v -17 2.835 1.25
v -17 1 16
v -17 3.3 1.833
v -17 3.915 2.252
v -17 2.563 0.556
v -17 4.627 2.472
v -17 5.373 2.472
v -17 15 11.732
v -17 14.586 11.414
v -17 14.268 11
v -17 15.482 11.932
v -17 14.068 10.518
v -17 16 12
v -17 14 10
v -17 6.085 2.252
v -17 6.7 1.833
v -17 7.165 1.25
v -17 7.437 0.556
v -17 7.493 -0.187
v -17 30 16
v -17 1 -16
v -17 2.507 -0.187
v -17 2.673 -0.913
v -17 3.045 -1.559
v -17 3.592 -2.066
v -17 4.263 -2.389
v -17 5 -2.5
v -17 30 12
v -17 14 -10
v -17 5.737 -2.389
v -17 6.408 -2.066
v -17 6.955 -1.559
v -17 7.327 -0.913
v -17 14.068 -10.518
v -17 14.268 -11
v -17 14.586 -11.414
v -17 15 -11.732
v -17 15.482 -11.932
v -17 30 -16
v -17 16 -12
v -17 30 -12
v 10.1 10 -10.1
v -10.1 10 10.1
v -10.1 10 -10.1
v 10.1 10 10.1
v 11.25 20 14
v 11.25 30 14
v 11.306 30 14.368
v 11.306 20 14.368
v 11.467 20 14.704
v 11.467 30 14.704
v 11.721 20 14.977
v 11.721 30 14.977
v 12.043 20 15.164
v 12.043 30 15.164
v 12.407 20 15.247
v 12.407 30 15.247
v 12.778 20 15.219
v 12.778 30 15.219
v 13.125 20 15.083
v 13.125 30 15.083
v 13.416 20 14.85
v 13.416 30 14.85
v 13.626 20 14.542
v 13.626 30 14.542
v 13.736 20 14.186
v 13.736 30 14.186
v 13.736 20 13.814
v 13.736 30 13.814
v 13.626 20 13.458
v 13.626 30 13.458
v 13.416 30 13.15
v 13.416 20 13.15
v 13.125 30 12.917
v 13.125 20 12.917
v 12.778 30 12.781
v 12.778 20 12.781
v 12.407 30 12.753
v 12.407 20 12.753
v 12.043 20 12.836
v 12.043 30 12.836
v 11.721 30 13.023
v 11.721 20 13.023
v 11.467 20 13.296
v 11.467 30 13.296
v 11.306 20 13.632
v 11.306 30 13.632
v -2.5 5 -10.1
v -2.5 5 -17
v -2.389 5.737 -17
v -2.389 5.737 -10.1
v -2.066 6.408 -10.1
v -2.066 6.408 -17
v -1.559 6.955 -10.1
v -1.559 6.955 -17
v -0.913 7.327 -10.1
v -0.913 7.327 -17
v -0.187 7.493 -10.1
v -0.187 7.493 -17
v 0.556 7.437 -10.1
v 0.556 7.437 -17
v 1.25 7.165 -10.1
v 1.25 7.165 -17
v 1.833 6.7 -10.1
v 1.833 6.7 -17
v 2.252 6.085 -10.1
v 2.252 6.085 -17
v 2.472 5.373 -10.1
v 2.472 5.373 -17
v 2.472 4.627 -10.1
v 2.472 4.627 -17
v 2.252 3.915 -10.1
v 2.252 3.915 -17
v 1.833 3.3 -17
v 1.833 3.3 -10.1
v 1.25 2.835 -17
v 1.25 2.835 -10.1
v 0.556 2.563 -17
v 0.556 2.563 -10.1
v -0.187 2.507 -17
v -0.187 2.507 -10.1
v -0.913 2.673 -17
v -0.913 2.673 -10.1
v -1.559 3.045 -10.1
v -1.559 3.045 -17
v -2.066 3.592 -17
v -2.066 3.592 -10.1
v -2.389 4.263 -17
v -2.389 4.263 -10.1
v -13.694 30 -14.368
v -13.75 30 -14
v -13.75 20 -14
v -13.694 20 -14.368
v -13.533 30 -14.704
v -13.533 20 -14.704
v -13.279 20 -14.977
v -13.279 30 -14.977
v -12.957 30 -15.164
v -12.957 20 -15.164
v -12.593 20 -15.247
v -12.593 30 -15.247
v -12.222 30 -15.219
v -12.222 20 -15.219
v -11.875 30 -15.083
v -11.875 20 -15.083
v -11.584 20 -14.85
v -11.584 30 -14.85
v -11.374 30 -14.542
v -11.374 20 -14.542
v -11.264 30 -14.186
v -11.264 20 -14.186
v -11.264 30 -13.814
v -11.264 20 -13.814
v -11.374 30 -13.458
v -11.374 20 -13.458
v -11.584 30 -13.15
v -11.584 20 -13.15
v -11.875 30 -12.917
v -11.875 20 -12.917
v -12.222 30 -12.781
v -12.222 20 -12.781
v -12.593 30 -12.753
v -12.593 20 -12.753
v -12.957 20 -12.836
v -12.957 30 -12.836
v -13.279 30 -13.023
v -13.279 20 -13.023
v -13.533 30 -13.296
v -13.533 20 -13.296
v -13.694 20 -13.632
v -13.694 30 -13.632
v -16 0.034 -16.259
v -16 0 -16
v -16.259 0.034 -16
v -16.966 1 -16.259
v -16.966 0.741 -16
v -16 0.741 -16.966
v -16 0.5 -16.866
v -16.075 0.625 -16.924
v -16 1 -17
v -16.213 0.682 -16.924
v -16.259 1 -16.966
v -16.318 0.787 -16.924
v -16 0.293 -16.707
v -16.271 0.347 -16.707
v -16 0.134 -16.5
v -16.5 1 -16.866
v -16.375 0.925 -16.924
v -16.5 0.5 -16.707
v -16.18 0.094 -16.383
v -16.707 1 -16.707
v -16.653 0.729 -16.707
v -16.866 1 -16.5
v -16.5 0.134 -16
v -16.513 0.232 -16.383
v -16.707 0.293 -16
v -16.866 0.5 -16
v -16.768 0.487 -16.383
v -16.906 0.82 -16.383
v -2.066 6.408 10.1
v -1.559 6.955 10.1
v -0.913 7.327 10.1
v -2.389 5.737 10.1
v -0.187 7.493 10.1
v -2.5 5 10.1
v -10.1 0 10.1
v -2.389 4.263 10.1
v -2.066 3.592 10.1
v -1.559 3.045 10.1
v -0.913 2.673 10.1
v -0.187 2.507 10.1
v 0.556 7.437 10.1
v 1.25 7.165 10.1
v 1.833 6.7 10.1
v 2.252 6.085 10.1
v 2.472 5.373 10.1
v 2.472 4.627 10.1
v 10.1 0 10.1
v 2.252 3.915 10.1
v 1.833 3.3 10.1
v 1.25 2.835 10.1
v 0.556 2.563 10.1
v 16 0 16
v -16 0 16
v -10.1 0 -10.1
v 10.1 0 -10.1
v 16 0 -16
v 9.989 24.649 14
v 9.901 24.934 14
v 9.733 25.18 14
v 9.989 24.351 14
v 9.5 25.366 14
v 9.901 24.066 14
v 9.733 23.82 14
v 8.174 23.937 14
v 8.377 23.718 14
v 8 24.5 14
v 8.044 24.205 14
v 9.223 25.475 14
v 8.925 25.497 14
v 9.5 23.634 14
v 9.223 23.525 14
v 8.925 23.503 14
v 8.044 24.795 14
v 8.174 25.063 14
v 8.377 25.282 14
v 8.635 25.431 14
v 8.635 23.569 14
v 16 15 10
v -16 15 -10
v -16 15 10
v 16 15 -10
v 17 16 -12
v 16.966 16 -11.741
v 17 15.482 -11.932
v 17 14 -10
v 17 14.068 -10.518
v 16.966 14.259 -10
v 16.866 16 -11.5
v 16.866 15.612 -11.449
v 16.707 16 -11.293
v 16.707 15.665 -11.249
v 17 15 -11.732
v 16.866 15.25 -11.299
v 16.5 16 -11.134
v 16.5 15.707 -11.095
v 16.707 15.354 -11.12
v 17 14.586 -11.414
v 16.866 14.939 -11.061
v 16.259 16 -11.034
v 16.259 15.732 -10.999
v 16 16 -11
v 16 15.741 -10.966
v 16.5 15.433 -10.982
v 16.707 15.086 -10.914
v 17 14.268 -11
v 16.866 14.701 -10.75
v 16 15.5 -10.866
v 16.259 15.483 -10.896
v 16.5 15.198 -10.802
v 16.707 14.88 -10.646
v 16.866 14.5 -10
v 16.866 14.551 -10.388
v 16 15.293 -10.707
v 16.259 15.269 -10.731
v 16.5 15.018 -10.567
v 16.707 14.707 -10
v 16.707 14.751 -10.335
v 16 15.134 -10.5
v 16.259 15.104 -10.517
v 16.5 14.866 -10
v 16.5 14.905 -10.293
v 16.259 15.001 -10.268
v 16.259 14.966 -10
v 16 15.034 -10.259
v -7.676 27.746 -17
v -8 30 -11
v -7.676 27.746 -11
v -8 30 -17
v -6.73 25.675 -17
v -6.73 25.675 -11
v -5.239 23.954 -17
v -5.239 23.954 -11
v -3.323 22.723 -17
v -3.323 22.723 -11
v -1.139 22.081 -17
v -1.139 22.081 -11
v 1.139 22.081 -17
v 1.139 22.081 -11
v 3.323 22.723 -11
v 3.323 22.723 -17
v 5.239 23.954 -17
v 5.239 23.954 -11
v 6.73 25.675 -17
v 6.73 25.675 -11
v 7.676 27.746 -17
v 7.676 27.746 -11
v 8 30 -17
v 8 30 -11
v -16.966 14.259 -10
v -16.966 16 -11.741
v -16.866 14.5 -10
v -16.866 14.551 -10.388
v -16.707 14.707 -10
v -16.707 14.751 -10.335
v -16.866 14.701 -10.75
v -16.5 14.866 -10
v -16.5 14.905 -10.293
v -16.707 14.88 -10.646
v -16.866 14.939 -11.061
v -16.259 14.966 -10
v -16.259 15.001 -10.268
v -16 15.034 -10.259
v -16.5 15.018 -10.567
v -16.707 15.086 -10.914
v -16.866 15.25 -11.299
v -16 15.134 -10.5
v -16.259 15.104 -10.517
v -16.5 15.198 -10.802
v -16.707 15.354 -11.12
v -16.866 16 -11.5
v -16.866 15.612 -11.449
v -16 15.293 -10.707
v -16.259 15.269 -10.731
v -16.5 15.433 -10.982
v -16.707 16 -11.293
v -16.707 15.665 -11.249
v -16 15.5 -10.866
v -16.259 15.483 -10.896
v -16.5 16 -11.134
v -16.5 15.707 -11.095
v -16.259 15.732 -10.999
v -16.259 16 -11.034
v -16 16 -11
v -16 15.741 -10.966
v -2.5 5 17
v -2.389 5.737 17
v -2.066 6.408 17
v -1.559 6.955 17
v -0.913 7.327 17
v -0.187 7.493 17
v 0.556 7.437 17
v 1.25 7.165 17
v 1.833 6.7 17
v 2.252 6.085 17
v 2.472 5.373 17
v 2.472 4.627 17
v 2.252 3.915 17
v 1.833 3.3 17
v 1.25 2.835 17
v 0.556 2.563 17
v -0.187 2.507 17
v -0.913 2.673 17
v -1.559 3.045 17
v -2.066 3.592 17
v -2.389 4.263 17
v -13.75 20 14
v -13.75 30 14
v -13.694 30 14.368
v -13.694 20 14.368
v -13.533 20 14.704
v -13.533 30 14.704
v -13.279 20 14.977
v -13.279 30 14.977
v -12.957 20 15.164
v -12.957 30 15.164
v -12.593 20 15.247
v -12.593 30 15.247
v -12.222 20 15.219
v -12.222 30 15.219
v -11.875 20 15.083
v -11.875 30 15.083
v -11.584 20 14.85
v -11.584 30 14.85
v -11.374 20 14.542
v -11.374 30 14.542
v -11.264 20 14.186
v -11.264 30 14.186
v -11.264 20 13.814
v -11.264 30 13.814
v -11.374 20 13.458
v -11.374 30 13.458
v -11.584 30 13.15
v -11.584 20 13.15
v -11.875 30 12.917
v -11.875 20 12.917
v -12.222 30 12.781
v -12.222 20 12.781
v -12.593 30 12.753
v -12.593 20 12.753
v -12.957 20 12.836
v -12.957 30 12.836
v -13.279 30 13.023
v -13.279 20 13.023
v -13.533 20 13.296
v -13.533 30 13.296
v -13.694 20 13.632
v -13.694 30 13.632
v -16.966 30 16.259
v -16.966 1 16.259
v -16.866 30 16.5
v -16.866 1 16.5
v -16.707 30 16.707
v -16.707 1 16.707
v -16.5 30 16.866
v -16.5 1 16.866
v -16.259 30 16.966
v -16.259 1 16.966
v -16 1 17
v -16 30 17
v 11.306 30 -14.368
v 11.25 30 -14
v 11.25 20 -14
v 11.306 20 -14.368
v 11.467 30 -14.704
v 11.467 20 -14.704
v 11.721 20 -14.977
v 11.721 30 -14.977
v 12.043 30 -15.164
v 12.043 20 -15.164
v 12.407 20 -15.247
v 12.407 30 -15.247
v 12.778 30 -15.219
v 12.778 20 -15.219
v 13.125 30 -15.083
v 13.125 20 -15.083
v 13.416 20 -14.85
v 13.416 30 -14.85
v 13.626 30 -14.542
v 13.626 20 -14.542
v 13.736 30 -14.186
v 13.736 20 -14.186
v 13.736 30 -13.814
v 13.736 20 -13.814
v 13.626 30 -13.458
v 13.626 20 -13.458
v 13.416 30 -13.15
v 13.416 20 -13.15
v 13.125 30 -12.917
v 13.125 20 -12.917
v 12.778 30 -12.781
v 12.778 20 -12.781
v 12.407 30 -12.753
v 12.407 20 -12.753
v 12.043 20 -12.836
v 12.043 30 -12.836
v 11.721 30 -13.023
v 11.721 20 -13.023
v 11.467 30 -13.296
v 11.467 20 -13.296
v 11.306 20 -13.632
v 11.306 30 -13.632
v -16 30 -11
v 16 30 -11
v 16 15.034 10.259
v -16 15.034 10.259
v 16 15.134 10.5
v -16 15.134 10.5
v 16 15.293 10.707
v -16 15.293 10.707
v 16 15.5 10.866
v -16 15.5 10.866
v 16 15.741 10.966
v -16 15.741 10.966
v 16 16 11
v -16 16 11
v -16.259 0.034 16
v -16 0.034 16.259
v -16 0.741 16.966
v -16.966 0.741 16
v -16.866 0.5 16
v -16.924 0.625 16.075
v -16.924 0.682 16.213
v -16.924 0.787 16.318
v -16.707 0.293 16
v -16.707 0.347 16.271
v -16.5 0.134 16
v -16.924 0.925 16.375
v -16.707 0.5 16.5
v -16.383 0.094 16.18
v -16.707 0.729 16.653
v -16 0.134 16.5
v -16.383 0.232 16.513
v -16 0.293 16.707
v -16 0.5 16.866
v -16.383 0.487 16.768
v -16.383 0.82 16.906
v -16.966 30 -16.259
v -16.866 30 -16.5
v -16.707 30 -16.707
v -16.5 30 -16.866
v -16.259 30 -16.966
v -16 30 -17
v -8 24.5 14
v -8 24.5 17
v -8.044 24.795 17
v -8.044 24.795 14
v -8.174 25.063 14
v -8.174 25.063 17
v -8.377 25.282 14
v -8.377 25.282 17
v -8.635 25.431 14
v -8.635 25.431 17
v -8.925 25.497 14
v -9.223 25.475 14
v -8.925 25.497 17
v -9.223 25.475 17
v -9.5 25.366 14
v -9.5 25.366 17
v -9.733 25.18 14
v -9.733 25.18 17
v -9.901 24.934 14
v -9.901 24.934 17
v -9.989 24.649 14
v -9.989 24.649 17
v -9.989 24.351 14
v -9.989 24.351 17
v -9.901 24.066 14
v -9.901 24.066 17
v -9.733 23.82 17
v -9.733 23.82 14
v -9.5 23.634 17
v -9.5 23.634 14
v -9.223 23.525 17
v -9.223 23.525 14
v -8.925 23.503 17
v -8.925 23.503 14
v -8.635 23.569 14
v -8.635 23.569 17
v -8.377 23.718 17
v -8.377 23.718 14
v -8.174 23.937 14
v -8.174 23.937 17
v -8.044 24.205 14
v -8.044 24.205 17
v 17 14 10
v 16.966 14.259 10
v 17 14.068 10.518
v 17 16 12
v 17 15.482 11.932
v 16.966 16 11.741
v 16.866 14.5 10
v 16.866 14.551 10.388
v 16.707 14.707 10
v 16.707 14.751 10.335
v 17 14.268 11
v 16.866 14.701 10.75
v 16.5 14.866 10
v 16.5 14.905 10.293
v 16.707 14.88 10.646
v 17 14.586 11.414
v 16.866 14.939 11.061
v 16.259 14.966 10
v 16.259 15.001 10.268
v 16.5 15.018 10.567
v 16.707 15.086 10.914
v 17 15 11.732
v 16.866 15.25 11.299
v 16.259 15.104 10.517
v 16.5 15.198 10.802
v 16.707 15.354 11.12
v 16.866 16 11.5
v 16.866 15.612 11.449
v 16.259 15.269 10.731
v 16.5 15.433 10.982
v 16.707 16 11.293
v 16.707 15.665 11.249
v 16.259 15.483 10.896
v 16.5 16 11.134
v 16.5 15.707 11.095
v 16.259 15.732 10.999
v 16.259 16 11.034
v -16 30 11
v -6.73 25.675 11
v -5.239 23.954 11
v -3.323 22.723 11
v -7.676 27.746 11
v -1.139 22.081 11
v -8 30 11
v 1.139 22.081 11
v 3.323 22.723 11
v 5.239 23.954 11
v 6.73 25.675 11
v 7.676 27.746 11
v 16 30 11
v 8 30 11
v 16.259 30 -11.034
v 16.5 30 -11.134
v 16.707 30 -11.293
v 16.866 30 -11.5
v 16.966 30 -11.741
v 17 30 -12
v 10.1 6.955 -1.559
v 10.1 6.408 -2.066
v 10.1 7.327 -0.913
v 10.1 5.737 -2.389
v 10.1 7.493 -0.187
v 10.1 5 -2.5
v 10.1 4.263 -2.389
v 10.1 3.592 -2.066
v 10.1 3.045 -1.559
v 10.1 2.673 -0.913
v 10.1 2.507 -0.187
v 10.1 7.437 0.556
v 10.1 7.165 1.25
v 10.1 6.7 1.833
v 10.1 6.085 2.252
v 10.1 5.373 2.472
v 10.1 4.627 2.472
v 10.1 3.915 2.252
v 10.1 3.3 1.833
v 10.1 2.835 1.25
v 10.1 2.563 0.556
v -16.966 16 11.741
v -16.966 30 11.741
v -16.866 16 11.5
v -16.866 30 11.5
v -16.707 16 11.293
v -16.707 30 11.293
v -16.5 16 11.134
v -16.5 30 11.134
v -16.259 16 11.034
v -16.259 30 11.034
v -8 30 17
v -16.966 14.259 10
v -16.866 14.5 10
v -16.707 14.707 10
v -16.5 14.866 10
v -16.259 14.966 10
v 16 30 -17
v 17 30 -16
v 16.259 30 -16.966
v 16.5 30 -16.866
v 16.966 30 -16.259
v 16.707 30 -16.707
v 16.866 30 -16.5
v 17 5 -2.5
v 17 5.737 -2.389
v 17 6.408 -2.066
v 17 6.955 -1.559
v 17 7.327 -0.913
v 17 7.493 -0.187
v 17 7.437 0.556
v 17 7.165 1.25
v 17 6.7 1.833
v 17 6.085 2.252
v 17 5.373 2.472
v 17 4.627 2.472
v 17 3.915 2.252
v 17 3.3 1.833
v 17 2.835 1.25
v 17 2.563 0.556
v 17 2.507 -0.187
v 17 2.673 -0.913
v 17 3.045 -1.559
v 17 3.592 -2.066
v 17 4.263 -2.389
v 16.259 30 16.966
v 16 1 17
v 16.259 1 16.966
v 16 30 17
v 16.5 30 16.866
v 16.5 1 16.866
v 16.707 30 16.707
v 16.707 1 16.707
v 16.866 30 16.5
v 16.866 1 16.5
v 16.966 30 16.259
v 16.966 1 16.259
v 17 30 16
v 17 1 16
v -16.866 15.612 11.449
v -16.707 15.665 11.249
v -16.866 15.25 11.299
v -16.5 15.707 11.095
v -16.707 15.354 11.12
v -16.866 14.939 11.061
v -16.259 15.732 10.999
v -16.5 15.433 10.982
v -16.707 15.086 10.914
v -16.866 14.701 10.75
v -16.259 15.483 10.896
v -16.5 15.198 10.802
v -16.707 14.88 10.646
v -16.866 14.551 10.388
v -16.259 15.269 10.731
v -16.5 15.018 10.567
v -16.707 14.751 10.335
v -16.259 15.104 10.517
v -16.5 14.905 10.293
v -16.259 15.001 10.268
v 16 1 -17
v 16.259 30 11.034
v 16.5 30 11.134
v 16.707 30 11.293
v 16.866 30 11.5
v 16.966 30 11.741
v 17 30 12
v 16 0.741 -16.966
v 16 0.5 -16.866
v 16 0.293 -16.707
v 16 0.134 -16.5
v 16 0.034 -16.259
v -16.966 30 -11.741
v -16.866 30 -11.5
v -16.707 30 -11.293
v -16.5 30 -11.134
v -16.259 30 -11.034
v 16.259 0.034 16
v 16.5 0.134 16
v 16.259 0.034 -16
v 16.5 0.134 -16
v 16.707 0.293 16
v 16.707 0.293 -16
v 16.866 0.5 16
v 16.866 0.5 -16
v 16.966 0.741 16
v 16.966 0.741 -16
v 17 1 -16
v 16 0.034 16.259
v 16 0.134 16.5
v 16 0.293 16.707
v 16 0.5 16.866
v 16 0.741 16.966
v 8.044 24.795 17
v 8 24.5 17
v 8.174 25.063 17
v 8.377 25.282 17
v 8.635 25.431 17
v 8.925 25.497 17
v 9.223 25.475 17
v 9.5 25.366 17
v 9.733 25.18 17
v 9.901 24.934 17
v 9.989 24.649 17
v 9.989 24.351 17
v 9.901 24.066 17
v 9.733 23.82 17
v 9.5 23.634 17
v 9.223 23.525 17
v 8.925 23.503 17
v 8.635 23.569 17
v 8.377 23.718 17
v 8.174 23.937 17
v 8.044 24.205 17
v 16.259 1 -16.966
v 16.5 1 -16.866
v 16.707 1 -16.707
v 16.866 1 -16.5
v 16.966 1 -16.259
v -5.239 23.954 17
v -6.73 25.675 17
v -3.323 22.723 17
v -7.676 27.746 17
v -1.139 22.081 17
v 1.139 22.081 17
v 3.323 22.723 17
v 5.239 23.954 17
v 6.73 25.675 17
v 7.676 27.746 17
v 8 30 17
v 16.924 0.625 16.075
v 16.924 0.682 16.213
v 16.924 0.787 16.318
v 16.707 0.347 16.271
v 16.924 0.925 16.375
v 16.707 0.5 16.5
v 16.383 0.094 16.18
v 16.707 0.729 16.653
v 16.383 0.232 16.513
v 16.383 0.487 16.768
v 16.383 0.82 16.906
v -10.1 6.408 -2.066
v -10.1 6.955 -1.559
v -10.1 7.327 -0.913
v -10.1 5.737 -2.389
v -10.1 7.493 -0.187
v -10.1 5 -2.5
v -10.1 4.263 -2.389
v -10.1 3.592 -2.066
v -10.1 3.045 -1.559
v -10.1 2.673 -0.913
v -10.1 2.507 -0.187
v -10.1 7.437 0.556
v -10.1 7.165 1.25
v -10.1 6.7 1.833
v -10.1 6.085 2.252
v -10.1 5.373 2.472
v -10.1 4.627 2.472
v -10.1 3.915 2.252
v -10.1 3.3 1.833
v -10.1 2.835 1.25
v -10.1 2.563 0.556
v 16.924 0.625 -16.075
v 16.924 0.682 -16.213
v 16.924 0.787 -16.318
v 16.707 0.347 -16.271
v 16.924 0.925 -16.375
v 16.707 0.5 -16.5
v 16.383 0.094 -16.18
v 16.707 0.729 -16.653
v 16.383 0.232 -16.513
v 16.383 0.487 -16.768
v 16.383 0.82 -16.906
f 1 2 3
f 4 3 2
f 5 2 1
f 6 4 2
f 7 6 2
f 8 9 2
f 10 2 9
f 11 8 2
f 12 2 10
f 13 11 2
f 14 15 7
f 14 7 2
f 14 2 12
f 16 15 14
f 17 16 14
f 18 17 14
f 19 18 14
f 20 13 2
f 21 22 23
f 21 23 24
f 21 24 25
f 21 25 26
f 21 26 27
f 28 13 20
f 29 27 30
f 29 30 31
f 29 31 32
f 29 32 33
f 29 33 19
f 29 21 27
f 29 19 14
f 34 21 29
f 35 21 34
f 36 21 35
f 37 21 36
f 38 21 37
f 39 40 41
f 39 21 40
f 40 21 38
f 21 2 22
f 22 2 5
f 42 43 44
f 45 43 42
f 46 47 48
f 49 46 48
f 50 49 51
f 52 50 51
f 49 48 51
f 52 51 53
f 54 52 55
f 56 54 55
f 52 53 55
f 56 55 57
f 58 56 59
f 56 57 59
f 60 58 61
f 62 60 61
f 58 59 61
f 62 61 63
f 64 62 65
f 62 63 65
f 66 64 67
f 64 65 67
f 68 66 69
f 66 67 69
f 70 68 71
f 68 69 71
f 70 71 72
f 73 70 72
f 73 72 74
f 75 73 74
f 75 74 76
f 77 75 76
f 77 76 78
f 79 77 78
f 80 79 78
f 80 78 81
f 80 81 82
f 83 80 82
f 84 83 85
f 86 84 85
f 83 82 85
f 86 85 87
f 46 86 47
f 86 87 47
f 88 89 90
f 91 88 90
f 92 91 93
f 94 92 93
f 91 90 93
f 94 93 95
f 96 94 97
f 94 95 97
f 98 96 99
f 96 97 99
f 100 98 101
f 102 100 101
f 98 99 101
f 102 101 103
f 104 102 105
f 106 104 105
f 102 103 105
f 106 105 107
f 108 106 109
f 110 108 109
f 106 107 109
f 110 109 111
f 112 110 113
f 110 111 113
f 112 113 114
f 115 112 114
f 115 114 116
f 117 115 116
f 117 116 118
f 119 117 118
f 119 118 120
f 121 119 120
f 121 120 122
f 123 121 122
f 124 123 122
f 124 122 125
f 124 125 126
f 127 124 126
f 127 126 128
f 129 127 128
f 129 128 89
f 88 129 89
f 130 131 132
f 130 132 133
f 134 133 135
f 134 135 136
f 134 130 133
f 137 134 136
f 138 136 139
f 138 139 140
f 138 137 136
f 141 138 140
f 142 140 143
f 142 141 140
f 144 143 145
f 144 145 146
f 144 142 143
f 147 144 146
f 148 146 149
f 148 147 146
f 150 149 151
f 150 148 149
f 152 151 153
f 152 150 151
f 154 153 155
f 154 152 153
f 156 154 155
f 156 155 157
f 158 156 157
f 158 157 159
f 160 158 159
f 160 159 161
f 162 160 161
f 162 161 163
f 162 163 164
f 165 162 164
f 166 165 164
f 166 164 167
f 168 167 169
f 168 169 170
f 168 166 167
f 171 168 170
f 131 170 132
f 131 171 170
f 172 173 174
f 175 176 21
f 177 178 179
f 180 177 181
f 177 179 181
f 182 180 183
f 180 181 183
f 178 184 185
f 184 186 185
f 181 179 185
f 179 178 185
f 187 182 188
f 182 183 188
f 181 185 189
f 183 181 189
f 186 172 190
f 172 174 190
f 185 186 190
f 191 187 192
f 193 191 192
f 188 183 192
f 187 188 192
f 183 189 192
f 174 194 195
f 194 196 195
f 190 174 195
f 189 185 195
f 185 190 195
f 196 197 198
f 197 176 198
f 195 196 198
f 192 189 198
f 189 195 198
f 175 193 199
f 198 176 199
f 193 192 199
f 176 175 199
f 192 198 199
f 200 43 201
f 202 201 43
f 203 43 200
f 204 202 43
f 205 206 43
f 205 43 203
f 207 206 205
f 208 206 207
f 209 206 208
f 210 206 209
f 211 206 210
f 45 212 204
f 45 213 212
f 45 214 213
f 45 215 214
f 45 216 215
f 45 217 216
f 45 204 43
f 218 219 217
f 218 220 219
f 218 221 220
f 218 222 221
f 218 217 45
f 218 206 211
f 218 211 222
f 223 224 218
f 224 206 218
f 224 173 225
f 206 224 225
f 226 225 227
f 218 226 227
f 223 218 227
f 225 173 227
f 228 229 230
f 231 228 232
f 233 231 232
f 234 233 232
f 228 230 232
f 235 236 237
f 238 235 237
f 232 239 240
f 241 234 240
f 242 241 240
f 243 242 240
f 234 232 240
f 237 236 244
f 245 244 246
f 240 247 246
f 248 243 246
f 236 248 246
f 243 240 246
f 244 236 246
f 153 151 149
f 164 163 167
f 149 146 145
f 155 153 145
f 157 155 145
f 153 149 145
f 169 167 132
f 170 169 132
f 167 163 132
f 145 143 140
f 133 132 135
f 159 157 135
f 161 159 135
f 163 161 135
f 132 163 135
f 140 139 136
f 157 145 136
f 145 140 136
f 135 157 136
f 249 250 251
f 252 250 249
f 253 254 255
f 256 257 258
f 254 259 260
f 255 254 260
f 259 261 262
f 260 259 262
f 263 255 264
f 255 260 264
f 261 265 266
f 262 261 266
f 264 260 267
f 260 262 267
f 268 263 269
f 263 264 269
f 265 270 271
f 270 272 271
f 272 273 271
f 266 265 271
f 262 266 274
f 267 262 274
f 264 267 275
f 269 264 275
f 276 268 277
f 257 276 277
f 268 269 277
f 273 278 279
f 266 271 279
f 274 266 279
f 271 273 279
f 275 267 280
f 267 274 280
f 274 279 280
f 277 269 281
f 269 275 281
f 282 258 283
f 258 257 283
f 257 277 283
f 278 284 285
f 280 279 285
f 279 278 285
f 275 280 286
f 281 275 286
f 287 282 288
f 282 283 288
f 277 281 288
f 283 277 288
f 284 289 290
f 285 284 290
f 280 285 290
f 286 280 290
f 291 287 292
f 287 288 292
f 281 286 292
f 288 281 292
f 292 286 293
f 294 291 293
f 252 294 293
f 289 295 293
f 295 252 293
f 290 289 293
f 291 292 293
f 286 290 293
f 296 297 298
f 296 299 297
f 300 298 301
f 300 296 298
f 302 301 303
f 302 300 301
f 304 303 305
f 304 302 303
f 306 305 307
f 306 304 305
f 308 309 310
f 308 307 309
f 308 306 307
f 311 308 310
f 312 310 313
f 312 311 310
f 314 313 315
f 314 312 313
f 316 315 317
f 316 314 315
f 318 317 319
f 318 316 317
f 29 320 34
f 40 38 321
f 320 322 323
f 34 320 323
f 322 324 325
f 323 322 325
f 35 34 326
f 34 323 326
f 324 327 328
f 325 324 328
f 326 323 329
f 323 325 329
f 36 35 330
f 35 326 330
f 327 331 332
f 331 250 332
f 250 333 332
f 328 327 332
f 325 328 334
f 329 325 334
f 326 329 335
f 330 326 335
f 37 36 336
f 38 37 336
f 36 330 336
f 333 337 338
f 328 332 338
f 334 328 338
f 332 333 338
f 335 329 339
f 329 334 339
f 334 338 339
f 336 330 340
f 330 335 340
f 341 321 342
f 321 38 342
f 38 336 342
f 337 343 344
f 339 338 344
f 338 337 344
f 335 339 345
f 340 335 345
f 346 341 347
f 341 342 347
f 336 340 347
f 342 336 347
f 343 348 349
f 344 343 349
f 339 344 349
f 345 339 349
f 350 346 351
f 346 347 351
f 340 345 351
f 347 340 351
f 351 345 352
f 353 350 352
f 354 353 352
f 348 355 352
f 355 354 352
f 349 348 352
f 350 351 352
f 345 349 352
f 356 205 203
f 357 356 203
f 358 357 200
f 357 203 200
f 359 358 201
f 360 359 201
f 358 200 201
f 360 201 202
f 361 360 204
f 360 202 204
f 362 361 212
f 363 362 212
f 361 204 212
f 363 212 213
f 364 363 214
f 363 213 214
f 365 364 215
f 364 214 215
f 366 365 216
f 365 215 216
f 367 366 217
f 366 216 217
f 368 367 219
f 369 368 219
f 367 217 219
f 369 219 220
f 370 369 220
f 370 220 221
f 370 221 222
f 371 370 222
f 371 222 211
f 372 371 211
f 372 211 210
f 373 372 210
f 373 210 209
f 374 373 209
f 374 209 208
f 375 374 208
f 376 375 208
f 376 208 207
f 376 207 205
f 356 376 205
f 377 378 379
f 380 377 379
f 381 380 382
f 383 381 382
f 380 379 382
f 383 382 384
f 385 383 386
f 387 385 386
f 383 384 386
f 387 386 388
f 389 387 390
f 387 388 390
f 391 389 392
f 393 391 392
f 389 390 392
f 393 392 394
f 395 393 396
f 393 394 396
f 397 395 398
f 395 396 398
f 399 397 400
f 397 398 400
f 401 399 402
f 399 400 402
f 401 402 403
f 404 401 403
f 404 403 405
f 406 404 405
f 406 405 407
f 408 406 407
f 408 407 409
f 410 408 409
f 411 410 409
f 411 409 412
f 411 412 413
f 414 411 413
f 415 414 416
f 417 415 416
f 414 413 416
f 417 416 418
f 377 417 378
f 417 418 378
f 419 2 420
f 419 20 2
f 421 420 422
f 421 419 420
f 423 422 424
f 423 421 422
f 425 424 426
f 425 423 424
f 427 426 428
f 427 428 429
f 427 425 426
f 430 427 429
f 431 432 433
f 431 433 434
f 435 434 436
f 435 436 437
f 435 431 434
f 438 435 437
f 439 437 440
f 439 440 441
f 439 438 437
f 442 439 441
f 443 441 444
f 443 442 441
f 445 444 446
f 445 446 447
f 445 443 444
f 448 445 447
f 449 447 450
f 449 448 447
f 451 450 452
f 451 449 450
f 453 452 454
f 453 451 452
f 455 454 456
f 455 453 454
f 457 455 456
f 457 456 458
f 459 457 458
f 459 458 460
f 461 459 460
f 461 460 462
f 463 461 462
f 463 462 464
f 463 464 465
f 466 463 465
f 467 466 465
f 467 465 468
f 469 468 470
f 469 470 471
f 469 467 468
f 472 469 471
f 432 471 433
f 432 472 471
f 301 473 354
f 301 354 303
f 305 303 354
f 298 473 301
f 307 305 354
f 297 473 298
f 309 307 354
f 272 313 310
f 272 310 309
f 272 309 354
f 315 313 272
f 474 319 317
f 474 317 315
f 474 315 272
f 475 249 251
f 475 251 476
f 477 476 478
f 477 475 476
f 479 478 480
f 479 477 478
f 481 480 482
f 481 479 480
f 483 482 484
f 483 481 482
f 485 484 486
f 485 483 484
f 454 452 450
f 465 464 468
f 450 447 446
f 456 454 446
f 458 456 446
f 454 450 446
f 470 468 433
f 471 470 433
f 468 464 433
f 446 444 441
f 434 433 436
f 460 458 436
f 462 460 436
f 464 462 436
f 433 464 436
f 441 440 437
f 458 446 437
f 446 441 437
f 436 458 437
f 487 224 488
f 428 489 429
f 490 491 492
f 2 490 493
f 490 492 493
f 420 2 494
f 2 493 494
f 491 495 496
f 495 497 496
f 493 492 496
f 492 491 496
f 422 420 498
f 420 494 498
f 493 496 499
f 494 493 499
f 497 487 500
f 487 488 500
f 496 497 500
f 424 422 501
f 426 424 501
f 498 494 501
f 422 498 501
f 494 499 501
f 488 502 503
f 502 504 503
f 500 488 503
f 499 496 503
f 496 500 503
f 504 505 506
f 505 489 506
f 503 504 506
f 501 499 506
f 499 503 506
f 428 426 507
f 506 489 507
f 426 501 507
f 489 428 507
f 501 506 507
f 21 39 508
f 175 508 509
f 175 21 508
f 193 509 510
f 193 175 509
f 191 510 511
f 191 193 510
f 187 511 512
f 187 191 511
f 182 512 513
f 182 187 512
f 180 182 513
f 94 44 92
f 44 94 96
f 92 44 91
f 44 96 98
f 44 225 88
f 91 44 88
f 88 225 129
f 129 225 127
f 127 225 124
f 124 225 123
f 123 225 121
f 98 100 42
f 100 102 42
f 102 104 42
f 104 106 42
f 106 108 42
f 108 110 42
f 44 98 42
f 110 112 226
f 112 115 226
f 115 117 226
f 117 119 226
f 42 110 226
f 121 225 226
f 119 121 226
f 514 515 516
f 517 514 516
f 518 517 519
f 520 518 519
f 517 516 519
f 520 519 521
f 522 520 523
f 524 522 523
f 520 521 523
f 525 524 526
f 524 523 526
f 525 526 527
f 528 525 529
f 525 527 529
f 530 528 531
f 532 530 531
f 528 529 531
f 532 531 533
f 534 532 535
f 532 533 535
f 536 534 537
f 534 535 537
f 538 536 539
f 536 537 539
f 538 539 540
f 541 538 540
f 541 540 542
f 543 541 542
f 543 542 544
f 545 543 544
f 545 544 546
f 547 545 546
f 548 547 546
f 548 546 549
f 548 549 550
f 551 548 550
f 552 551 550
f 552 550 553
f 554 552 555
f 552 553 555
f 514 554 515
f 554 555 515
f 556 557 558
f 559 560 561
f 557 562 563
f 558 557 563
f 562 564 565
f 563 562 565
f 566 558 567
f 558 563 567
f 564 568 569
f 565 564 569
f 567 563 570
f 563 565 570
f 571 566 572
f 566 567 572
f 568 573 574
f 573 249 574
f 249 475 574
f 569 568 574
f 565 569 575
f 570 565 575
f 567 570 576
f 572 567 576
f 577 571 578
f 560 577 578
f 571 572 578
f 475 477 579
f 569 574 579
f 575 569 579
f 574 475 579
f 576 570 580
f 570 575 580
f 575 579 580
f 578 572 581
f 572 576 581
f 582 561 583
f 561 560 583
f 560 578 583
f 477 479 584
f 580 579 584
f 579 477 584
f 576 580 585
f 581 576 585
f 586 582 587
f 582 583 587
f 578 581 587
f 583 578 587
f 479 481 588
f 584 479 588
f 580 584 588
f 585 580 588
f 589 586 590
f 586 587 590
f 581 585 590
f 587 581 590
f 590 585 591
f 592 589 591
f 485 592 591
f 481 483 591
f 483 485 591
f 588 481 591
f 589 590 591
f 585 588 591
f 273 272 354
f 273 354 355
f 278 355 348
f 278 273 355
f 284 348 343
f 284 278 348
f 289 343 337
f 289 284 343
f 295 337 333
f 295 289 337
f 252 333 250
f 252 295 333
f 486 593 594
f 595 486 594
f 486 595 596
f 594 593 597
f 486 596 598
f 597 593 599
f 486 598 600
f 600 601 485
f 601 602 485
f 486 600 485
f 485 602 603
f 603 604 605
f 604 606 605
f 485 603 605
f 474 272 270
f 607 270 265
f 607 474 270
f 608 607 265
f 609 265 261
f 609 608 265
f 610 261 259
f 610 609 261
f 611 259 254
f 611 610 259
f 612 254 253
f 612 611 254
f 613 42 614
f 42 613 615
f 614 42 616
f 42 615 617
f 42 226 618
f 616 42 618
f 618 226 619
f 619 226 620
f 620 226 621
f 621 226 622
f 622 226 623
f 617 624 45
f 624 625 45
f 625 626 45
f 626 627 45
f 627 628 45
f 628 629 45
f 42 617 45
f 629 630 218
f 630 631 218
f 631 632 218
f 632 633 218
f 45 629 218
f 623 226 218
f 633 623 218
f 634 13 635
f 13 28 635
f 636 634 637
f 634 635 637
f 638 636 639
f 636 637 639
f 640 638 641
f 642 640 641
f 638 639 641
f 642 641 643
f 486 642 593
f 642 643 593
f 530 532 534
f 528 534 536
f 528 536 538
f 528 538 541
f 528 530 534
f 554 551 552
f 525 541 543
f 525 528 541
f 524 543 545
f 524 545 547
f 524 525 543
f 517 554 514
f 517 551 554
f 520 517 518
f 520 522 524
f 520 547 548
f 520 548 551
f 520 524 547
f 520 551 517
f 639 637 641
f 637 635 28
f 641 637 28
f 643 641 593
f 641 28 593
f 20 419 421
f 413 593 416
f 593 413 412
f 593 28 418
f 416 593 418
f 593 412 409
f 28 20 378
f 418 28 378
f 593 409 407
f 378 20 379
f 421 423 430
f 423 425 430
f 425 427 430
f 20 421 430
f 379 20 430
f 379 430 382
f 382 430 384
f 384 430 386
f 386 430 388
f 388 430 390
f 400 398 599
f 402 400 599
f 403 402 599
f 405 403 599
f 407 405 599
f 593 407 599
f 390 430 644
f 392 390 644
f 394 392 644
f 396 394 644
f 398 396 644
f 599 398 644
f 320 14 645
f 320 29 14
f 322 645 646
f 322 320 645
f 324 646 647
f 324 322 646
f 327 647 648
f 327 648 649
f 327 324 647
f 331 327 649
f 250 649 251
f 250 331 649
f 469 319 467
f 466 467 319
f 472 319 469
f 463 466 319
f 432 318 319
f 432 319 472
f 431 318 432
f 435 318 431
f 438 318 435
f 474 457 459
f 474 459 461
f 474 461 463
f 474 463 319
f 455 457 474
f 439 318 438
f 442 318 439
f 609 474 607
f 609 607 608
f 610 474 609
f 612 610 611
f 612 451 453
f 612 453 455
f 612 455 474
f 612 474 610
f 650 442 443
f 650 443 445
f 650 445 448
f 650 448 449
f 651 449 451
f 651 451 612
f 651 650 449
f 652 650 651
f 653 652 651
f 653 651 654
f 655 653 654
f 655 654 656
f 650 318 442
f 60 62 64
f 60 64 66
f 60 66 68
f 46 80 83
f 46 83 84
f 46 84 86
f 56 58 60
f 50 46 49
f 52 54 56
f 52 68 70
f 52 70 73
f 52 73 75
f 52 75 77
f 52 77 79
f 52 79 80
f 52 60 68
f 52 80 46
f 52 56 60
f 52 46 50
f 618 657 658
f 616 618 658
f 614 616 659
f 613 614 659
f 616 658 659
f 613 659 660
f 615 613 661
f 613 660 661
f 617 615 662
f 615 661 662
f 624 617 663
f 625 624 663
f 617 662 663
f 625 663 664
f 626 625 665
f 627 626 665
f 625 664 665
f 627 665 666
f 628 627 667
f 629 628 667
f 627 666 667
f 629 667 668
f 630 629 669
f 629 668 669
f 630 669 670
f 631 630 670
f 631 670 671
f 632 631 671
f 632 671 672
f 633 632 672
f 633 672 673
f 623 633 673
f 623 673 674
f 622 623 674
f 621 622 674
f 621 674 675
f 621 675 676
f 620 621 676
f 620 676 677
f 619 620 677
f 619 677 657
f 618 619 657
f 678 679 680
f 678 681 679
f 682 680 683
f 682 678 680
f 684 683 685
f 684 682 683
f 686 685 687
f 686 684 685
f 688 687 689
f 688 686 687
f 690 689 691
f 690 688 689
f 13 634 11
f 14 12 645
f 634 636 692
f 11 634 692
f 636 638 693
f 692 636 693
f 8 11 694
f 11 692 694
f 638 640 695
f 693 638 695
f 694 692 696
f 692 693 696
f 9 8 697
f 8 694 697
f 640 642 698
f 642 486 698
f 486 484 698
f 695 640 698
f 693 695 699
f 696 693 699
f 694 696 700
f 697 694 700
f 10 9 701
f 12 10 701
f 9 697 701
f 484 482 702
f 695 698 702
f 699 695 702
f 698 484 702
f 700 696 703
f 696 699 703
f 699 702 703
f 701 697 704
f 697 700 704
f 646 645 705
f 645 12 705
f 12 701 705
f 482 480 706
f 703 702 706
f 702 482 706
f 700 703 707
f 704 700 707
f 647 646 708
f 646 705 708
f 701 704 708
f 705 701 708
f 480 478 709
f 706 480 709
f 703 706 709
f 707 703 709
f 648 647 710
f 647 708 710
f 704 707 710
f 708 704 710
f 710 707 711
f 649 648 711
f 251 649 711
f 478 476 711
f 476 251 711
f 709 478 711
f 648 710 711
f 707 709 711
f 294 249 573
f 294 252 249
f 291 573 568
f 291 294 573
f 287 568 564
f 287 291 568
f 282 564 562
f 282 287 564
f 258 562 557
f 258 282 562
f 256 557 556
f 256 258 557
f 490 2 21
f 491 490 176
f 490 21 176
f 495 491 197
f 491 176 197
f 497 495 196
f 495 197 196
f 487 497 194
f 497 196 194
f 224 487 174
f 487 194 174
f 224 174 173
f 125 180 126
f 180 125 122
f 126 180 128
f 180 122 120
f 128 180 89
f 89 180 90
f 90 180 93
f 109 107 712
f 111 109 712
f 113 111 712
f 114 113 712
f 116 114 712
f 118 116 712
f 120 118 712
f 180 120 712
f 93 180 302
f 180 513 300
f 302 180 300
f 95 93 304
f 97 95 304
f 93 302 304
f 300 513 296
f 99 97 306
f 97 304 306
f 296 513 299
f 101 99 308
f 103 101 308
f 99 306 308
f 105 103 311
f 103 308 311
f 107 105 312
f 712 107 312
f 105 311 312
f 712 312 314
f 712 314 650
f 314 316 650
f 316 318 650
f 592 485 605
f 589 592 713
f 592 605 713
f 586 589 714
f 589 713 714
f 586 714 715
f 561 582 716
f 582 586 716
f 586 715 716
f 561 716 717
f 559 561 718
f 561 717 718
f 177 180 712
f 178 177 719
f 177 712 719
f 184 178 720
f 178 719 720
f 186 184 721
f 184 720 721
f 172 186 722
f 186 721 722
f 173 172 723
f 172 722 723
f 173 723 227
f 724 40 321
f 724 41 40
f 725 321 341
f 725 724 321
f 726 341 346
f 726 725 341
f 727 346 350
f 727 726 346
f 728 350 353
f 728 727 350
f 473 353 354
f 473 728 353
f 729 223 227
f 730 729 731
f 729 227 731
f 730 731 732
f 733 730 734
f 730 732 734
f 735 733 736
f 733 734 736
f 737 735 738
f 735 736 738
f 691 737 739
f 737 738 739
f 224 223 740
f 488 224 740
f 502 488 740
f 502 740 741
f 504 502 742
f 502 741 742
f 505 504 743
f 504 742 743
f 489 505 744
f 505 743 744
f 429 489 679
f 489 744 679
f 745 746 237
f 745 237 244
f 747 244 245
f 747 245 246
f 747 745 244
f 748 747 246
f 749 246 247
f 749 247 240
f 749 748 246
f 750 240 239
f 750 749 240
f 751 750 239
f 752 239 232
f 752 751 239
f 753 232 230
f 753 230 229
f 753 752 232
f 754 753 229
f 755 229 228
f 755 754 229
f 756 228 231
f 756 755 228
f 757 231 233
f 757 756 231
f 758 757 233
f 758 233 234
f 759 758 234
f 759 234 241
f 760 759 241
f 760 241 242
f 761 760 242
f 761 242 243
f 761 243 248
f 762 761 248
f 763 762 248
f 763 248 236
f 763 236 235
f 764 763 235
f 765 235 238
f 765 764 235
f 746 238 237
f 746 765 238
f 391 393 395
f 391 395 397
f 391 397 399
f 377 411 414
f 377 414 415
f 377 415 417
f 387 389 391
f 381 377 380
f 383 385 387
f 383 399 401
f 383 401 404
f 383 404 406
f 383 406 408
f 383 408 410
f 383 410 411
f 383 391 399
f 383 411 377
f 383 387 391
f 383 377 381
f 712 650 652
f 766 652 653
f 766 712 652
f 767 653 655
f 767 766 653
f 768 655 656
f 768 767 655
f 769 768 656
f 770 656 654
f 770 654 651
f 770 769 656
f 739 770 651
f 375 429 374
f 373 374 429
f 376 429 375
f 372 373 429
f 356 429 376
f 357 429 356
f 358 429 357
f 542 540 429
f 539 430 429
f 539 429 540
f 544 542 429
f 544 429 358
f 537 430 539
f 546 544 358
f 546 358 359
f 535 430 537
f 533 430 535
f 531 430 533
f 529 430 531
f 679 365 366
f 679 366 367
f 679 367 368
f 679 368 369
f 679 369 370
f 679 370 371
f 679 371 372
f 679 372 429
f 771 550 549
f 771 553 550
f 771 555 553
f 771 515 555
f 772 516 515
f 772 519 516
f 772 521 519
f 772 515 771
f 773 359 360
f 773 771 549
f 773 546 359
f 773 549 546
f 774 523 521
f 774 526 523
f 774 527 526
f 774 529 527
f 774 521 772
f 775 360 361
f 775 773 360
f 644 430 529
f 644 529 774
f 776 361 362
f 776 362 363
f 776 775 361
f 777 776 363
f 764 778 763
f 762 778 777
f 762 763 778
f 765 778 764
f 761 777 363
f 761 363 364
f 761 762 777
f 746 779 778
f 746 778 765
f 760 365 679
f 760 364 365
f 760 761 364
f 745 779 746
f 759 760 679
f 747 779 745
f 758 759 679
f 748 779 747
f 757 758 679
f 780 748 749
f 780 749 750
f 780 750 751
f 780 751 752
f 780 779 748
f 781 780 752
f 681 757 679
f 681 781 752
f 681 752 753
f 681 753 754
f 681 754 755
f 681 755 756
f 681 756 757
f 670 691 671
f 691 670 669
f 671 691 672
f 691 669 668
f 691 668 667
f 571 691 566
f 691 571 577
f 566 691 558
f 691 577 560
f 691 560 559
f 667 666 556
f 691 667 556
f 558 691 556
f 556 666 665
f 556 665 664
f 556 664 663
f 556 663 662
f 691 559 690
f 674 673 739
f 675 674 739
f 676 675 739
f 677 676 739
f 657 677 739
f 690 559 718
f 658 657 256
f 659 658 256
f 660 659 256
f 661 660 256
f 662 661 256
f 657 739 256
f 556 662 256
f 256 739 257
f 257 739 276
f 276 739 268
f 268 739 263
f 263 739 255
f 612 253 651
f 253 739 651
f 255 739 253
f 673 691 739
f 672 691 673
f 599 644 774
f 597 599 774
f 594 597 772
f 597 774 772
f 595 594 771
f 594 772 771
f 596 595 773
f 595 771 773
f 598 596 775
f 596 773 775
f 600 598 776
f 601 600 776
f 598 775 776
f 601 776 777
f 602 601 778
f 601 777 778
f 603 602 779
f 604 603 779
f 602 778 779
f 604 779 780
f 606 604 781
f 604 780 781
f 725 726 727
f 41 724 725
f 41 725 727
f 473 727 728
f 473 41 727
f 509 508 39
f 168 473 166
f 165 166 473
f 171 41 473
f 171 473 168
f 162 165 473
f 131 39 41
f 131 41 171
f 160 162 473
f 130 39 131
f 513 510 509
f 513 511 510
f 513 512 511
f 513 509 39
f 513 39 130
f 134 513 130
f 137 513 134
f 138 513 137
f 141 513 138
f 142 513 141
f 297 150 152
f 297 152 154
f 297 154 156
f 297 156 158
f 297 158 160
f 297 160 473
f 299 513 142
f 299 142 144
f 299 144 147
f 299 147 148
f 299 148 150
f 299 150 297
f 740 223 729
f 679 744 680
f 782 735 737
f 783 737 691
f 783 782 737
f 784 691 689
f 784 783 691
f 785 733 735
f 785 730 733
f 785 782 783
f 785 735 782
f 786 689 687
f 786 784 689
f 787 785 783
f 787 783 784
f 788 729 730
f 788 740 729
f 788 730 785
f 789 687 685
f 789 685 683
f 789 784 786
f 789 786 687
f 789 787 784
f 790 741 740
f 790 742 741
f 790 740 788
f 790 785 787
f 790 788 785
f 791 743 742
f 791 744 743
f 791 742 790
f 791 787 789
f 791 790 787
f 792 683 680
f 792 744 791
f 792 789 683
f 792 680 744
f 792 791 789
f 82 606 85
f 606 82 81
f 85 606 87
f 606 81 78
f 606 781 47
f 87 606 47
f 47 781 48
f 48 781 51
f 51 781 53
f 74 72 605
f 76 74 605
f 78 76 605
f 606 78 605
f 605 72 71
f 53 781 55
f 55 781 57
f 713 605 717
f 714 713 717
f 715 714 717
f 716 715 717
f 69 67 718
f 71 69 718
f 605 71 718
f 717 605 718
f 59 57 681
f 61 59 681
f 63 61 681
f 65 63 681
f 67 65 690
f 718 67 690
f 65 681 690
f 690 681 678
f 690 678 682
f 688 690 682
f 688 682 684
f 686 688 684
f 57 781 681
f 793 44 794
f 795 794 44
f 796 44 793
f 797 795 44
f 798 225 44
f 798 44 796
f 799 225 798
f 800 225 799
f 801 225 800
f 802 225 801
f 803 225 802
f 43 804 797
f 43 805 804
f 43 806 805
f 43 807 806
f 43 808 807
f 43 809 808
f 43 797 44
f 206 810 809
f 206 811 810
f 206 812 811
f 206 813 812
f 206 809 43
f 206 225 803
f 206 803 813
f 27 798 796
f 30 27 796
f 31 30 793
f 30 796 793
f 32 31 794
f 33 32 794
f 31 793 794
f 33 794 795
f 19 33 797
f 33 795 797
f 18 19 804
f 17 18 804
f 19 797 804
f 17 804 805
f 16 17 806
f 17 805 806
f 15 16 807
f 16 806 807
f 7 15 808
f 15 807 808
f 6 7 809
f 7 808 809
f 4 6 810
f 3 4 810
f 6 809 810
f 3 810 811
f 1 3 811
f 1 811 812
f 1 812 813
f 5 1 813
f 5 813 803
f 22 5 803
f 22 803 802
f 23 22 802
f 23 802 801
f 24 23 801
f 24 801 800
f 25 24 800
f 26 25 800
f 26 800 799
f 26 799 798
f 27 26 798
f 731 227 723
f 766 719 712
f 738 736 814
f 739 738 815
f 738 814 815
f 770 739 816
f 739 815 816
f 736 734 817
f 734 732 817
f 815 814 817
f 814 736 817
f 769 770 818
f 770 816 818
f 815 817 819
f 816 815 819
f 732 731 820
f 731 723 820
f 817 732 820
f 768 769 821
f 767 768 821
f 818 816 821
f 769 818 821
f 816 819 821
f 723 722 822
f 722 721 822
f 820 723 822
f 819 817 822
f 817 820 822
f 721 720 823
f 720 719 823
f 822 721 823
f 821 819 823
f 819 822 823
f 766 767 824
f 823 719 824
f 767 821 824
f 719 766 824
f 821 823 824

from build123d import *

# Parameters (mm, degrees)
SKETCH1_W           = 34
SKETCH1_H           = 34
BOSS_EXTRUDE1_DEPTH = 15
SKETCH2_W           = 20.2
SKETCH2_H           = 20.2
CUT_EXTRUDE1_DEPTH  = 10
SKETCH4_W           = 34
SKETCH4_H           = 15
BOSS_EXTRUDE2_DEPTH = 6
SKETCH7_R           = 8
CUT_EXTRUDE4_DEPTH  = 49.425200051
SKETCH17_R          = 1.25
CUT_EXTRUDE10_DEPTH = 10
SKETCH15_R          = 2.5
CUT_EXTRUDE8_DEPTH  = 49.425200051
SKETCH16_R          = 2.5
CUT_EXTRUDE9_DEPTH  = 49.425200051
FILLET2_R           = 1
SKETCH19_R          = 1
CUT_EXTRUDE12_DEPTH = 3


with BuildPart() as part:
    # Sketch1 → Boss-Extrude1 (new body)
    with BuildSketch(Plane(origin=(0, 0, 0), x_dir=(1, 0, 0), z_dir=(0, 1, 0))):
        Rectangle(SKETCH1_W, SKETCH1_H)
    extrude(amount=BOSS_EXTRUDE1_DEPTH)

    # Sketch2 → Cut-Extrude1 (cut)
    with BuildSketch(Plane.XZ):
        Rectangle(SKETCH2_W, SKETCH2_H)
    extrude(amount=-CUT_EXTRUDE1_DEPTH, mode=Mode.SUBTRACT)

    # Sketch4 → Boss-Extrude2 (add)
    with BuildSketch(Plane.XY.offset(17)):
        with Locations((0, 22.5)):
            Rectangle(SKETCH4_W, SKETCH4_H)
    boss_extrude2 = extrude(amount=-BOSS_EXTRUDE2_DEPTH)

    # Sketch7 → Cut-Extrude4 (cut, through all)
    with BuildSketch(Plane.XY.offset(17)):
        with Locations((0, 30)):
            Circle(SKETCH7_R)
    cut_extrude4 = extrude(amount=-CUT_EXTRUDE4_DEPTH, mode=Mode.SUBTRACT)

    # Sketch17 → Cut-Extrude10 (cut)
    with BuildSketch(Plane(origin=(0, 30, 0), x_dir=(1, 0, 0), z_dir=(0, 1, 0))):
        with Locations(Location((-12.5, -14, 0), (0, 0, 180))):
            Circle(SKETCH17_R)
        with Locations(Location((12.5, -14, 0), (0, 0, 180))):
            Circle(SKETCH17_R)
    cut_extrude10 = extrude(amount=-CUT_EXTRUDE10_DEPTH, mode=Mode.SUBTRACT)

    # Mirror1: Boss-Extrude2, Cut-Extrude4, Cut-Extrude10 across plane
    add(boss_extrude2.mirror(Plane.XY))
    add(cut_extrude4.mirror(Plane.XY), mode=Mode.SUBTRACT)
    add(cut_extrude10.mirror(Plane.XY), mode=Mode.SUBTRACT)

    # Sketch15 → Cut-Extrude8 (cut, through all)
    with BuildSketch(Plane(origin=(0, 0, -17), x_dir=(-1, 0, 0), z_dir=(0, 0, -1))):
        with Locations((0, 5)):
            Circle(SKETCH15_R)
    extrude(amount=-CUT_EXTRUDE8_DEPTH, mode=Mode.SUBTRACT)

    # Sketch16 → Cut-Extrude9 (cut, through all)
    with BuildSketch(Plane(origin=(17, 0, 0), x_dir=(0, 0, -1), z_dir=(1, 0, 0))):
        with Locations((0, 5)):
            Circle(SKETCH16_R)
    extrude(amount=-CUT_EXTRUDE9_DEPTH, mode=Mode.SUBTRACT)

    # Fillet2
    fillet2_edges = [part.edges().sort_by_distance(p)[0] for p in [
        (17, 15, 0),
        (17, 22.5, 11),
        (0, 15, 11),
        (-17, 22.5, 11),
        (0, 0, 17),
        (-17, 0, 0),
        (0, 0, -17),
        (17, 0, 0),
        (-17, 15, 0),
        (-17, 22.5, -11),
        (0, 15, -11),
        (17, 22.5, -11),
        (17, 15, 17),
        (-17, 15, 17),
        (-17, 15, -17),
        (17, 15, -17),
    ]]
    fillet(fillet2_edges, radius=FILLET2_R)

    # Sketch19 → Cut-Extrude12 (cut)
    with BuildSketch(Plane.XY.offset(17)):
        with Locations((-9, 24.5)):
            Circle(SKETCH19_R)
    cut_extrude12 = extrude(amount=-CUT_EXTRUDE12_DEPTH, mode=Mode.SUBTRACT)

    # Mirror2: Cut-Extrude12 across plane
    add(cut_extrude12.mirror(Plane(origin=(0, 0, 0), x_dir=(0, 0, 1), z_dir=(1, 0, 0))), mode=Mode.SUBTRACT)


solid = part.part
